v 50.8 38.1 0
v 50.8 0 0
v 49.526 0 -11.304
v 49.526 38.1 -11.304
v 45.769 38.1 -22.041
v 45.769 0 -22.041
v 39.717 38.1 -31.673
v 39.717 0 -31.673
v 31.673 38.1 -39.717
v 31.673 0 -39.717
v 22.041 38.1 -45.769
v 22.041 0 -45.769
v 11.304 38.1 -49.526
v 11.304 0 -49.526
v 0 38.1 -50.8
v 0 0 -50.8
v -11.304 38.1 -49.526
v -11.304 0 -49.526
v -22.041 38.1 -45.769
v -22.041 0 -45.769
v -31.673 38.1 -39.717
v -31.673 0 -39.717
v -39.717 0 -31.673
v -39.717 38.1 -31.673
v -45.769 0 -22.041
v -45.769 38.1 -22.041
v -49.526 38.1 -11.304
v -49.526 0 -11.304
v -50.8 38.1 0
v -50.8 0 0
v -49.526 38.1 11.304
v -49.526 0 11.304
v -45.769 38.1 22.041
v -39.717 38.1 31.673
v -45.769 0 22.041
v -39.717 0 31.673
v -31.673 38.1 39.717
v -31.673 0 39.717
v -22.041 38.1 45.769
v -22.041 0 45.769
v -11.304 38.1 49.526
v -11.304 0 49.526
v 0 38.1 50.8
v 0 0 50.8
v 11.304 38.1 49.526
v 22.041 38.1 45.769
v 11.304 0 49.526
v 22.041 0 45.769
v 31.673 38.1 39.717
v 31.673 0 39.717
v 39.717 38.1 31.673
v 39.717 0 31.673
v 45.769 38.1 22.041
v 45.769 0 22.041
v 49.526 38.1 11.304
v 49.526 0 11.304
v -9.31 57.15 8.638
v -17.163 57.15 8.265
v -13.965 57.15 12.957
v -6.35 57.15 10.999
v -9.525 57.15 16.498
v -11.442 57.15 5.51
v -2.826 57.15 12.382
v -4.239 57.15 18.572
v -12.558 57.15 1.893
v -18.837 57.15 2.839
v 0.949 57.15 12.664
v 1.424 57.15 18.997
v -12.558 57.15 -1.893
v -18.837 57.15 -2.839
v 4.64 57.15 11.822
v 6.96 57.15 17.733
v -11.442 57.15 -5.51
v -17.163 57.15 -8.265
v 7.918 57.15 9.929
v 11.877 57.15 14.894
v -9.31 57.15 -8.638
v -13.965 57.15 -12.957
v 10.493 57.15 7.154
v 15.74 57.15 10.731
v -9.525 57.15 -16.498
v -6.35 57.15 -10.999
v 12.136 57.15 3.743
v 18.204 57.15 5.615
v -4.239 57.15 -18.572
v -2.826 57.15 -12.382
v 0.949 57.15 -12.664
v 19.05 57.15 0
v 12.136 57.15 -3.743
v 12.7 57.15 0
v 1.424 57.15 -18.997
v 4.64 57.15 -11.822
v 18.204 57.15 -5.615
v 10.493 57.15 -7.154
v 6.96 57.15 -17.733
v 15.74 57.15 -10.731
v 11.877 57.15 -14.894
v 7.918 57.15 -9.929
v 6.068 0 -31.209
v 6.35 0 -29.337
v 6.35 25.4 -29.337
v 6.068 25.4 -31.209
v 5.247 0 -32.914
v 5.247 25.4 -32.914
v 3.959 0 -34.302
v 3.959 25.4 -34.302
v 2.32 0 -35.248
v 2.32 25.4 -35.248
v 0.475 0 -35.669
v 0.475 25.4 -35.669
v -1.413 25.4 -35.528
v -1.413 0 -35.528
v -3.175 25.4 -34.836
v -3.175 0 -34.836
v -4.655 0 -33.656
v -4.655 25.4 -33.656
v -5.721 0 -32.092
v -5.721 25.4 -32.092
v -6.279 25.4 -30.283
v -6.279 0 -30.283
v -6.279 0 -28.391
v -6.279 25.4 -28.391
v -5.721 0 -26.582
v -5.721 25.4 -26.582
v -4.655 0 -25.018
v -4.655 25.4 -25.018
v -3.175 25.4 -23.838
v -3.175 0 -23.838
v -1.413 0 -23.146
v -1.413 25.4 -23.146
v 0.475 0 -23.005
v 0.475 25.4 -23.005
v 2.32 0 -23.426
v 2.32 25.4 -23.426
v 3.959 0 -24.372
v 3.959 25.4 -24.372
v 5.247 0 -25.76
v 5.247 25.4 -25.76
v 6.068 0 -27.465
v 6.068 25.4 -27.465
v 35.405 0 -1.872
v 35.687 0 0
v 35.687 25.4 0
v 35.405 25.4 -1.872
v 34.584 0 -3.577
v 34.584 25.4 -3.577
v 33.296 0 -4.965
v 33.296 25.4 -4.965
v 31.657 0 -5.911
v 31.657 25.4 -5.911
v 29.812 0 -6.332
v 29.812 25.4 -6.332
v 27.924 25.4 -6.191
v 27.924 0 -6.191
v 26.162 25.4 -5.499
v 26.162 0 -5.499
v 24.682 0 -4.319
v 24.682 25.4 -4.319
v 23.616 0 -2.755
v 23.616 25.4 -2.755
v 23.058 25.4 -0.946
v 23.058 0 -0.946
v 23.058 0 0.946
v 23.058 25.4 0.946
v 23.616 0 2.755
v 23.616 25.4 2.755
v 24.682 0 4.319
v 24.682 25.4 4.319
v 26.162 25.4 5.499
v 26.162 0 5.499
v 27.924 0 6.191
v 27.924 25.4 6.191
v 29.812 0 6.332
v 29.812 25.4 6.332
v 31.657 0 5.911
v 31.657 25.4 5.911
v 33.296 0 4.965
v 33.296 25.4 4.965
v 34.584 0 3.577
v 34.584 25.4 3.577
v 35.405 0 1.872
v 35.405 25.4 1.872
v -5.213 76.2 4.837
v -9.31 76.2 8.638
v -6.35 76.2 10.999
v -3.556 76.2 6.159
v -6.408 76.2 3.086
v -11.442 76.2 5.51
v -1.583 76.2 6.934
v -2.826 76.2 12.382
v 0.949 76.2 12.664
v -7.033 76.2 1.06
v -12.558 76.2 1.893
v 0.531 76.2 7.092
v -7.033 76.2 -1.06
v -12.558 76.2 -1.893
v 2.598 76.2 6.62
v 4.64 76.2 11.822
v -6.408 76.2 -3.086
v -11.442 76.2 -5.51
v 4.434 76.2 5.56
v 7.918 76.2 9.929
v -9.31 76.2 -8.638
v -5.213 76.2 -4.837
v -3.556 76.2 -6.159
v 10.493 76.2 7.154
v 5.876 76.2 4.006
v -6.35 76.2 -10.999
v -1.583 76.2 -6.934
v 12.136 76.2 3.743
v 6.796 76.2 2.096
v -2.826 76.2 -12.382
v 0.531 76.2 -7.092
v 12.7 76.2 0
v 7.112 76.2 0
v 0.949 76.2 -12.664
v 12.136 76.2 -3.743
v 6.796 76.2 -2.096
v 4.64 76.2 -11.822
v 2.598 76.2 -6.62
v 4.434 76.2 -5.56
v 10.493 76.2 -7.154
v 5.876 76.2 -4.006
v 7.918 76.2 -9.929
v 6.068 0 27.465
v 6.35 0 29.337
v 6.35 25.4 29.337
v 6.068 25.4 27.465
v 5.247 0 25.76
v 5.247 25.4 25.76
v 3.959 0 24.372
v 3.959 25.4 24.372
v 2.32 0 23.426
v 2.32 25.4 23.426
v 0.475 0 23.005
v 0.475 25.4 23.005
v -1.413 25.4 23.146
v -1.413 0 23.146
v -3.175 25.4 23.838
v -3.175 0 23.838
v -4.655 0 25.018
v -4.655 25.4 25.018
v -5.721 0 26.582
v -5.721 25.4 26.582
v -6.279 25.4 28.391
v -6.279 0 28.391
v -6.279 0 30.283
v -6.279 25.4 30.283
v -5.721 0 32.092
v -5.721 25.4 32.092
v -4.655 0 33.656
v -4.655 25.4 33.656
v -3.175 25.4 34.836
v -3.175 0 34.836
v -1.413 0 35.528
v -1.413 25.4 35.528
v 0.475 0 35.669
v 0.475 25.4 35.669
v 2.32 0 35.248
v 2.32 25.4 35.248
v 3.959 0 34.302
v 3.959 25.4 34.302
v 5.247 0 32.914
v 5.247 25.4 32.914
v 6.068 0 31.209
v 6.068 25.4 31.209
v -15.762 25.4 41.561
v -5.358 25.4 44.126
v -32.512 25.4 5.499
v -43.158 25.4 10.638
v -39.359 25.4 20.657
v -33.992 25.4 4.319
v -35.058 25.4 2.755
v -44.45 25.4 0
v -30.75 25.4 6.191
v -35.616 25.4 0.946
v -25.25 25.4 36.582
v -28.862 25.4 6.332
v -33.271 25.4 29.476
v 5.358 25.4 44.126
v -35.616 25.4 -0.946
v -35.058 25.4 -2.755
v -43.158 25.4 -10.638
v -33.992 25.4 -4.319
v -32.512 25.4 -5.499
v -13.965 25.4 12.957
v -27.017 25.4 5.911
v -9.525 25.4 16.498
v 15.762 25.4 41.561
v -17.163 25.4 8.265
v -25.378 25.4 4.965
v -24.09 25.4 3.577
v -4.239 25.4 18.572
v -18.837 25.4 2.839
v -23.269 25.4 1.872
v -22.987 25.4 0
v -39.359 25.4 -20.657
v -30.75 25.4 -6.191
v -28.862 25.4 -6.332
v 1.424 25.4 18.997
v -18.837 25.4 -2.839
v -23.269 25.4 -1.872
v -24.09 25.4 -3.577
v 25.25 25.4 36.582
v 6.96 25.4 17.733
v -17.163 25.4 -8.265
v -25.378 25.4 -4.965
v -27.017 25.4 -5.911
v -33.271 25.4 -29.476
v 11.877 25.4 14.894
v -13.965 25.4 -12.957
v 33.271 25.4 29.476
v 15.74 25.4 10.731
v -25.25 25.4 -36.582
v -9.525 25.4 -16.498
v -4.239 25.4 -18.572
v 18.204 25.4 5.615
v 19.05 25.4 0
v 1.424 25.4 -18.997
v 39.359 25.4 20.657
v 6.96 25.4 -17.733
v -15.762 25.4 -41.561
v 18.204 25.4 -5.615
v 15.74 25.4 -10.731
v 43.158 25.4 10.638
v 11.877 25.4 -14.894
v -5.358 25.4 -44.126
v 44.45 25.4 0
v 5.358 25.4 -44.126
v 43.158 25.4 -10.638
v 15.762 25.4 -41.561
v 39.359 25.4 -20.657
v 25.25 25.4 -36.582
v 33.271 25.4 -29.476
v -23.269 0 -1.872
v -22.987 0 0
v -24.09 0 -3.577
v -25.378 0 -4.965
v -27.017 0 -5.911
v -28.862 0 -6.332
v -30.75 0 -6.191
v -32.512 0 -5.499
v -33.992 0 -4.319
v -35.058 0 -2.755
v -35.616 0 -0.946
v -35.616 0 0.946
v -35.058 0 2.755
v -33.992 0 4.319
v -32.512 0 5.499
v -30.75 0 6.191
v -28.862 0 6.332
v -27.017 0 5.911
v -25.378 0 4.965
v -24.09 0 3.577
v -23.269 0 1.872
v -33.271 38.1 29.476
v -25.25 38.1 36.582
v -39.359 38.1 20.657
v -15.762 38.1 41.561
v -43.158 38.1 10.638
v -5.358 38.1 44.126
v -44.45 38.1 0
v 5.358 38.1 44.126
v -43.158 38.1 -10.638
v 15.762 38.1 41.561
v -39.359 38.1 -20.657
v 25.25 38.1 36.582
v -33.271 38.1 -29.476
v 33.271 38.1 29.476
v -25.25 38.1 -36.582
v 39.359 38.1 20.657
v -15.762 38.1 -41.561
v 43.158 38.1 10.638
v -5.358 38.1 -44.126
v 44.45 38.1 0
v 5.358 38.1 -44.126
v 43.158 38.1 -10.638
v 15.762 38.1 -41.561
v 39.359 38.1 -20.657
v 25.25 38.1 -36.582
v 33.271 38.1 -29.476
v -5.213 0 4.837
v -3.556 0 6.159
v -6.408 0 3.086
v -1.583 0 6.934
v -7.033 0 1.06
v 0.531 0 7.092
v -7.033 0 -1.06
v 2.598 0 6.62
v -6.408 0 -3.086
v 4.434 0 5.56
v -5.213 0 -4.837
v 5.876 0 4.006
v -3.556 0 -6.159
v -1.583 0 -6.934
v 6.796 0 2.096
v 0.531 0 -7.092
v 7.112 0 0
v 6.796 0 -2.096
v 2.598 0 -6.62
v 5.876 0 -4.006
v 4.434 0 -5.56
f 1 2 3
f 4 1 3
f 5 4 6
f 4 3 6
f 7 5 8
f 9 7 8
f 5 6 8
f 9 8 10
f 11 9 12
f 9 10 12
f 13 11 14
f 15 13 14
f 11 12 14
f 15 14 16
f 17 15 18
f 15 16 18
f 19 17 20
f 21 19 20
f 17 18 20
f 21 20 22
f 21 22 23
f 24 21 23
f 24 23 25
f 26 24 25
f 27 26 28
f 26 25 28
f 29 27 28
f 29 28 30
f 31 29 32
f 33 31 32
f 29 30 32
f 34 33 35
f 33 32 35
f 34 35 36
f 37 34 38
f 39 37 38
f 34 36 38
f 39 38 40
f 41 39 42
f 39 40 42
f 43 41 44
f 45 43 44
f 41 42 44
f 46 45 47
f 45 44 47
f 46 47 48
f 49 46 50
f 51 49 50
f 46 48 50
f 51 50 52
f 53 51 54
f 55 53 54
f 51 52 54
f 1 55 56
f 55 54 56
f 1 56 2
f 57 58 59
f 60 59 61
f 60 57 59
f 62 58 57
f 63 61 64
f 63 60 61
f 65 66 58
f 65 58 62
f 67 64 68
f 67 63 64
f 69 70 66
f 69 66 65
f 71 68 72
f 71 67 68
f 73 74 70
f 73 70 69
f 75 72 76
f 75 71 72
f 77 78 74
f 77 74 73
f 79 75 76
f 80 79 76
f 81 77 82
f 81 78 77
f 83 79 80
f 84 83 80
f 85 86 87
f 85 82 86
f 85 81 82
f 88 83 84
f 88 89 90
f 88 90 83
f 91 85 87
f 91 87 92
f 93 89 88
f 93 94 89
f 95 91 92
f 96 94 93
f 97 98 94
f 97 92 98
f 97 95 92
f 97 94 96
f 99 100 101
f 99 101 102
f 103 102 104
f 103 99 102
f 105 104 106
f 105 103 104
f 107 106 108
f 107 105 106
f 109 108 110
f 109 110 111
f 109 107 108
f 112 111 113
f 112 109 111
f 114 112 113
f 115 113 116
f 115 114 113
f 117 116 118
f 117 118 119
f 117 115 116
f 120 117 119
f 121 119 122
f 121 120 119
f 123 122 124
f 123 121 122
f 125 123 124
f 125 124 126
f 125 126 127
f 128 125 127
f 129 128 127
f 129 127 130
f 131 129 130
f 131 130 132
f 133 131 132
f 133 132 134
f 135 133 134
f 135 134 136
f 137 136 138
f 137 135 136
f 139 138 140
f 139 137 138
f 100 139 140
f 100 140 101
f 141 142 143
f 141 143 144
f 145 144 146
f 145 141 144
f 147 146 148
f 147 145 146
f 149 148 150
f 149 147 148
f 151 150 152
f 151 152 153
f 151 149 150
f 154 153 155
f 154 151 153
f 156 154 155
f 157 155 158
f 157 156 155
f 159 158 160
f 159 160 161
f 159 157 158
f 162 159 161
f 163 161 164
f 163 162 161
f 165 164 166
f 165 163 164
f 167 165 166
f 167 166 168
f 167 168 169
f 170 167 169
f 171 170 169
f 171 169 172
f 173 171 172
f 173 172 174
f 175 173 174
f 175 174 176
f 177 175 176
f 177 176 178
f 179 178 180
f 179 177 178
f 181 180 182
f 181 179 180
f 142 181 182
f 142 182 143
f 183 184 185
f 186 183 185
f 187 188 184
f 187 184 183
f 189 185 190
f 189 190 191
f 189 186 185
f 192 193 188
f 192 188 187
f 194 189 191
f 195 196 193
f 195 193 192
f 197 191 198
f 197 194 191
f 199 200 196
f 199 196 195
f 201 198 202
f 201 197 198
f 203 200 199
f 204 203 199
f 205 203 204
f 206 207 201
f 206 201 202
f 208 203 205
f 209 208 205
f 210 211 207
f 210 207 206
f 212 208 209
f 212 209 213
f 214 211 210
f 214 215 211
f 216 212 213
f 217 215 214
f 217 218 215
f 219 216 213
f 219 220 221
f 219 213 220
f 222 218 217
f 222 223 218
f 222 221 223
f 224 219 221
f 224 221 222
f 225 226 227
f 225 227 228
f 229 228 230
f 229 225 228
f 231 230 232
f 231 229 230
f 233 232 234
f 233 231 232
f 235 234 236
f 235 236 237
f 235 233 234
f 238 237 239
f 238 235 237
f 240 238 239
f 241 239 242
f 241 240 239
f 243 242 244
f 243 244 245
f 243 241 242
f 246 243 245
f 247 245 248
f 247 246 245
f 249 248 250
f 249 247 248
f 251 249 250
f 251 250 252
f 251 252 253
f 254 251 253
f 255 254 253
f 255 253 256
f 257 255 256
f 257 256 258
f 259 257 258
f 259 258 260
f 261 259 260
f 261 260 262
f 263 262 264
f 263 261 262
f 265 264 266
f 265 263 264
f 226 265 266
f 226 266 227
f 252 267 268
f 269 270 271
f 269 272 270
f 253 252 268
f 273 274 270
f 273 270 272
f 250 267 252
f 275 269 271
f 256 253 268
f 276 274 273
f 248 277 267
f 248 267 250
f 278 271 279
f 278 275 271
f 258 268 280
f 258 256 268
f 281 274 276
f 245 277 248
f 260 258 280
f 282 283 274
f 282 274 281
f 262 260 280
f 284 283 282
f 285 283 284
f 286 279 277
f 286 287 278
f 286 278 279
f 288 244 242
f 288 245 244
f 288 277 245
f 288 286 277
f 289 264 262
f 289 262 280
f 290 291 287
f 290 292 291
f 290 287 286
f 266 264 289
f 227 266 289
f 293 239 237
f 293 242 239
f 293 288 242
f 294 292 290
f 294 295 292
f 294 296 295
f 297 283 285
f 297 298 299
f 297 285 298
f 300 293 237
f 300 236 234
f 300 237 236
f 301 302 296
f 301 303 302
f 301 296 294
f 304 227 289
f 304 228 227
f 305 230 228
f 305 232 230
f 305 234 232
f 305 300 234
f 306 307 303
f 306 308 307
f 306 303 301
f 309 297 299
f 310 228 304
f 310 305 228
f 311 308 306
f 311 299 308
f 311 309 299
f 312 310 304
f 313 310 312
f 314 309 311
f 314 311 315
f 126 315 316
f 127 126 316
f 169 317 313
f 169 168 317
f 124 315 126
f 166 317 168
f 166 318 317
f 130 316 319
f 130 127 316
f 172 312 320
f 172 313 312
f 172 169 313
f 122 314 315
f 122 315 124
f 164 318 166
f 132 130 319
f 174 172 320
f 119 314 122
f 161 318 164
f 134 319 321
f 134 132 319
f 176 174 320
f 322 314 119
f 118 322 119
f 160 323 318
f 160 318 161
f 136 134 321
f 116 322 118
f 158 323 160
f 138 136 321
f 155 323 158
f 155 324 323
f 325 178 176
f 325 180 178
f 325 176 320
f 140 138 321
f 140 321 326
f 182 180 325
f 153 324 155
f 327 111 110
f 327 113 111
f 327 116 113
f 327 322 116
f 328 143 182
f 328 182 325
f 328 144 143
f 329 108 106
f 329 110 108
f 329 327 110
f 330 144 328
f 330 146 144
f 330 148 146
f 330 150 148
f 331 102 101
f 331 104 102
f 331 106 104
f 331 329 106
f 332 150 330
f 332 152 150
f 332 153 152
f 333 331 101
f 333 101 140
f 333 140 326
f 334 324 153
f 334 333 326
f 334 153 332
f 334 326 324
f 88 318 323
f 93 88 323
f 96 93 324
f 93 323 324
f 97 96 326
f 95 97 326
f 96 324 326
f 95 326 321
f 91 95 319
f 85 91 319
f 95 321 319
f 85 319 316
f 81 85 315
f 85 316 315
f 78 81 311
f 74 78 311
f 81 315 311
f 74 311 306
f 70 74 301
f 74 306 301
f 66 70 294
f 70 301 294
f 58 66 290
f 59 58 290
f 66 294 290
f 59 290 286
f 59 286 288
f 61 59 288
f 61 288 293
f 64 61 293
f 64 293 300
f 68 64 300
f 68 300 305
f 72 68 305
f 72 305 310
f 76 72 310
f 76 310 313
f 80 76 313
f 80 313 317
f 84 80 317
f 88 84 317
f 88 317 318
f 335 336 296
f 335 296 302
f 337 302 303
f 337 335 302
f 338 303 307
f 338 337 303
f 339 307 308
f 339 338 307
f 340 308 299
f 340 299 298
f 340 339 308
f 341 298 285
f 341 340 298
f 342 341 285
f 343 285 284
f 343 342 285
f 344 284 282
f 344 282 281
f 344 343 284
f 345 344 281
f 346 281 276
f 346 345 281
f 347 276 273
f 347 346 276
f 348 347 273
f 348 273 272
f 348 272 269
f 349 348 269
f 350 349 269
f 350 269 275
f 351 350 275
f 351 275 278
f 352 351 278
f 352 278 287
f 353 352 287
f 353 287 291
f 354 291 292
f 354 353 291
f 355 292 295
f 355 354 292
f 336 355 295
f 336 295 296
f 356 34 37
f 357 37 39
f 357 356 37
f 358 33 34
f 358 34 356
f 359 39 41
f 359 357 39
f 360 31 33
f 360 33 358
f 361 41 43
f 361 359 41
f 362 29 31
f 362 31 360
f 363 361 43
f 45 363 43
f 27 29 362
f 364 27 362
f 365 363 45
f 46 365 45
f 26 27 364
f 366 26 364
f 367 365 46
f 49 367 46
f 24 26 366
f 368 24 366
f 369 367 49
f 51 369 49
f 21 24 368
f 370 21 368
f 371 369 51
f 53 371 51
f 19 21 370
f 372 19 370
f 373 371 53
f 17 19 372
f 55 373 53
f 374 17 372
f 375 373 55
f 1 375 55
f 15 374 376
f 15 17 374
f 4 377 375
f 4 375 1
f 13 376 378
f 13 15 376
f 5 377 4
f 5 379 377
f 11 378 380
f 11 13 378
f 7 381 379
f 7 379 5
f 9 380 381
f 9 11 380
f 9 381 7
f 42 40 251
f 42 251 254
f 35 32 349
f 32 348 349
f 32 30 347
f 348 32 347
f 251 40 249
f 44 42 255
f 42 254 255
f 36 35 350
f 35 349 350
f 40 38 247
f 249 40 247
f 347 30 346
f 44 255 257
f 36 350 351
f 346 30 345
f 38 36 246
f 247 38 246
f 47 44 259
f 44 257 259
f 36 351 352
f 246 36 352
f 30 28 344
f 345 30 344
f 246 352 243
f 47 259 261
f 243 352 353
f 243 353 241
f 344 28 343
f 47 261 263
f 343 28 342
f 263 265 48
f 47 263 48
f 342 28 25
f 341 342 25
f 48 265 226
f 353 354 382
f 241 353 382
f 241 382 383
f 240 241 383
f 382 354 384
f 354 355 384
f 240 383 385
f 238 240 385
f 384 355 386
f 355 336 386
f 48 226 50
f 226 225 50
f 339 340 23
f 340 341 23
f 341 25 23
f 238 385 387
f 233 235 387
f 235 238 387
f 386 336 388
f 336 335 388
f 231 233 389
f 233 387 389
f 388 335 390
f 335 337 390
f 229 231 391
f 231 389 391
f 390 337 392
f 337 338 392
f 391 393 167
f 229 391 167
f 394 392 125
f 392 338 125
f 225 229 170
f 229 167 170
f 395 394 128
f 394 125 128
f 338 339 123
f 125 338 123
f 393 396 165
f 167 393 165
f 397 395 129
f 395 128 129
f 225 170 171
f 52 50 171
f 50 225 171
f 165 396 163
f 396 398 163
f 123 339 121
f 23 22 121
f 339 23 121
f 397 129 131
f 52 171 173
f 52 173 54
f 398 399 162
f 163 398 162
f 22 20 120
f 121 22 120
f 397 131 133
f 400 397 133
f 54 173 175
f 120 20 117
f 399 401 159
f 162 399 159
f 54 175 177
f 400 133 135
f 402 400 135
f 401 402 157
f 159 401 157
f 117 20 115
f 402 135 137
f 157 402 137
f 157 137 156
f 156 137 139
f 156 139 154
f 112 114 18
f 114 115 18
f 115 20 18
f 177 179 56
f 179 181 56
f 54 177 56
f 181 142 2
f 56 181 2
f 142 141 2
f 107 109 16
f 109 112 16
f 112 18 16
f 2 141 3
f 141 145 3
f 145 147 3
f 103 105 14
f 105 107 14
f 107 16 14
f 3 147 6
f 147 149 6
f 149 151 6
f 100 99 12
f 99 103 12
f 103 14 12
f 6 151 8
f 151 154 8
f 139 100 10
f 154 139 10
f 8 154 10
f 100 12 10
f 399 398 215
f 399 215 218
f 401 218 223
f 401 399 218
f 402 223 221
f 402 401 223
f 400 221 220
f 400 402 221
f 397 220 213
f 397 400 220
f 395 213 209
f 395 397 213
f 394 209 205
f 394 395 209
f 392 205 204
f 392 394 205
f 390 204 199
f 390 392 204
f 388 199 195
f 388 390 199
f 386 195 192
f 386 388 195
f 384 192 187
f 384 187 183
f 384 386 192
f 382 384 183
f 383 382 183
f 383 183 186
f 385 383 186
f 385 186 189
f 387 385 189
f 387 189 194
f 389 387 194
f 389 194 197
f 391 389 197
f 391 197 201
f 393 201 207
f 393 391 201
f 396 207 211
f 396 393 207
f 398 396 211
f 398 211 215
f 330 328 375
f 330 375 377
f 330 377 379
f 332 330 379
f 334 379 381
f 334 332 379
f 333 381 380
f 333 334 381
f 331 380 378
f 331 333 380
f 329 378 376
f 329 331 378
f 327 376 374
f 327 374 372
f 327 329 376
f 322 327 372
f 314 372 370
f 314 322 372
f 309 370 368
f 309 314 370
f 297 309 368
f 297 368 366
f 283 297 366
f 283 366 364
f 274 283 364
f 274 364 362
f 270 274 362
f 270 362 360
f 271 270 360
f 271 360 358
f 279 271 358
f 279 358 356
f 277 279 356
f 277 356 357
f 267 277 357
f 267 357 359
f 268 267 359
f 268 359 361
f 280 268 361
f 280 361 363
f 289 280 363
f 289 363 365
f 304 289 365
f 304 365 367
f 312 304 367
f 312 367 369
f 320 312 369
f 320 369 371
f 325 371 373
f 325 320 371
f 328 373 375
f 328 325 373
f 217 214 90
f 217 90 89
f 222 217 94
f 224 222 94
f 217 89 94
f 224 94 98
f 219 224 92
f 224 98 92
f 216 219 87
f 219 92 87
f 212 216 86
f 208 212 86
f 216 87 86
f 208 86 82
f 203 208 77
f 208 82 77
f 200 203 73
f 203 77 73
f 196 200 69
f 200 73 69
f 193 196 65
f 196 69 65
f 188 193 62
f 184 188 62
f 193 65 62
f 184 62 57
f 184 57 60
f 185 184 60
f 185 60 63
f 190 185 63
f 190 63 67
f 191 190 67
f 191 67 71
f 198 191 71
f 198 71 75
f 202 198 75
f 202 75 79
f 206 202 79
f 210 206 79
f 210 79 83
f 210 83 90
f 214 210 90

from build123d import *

# Parameters (mm, degrees)
SKETCH1_R           = 50.8
SKETCH1_R_2         = 44.45
BOSS_EXTRUDE1_DEPTH = 38.1
SKETCH1_4_R         = 44.45
SKETCH1_4_R_2       = 6.35
SKETCH1_4_R_3       = 19.05
BOSS_EXTRUDE3_DEPTH = 25.4
SKETCH1_5_R         = 19.05
SKETCH1_5_R_2       = 12.7
BOSS_EXTRUDE4_DEPTH = 57.15
SKETCH1_6_R         = 12.7
SKETCH1_6_R_2       = 7.112
BOSS_EXTRUDE5_DEPTH = 76.2


with BuildPart() as part:
    # Sketch1 → Boss-Extrude1 (new body)
    with BuildSketch(Plane(origin=(0, 0, 0), x_dir=(1, 0, 0), z_dir=(0, 1, 0))):
        Circle(SKETCH1_R)
        Circle(SKETCH1_R_2, mode=Mode.SUBTRACT)
    extrude(amount=BOSS_EXTRUDE1_DEPTH)

    # Sketch1<4> → Boss-Extrude3 (add)
    with BuildSketch(Plane(origin=(0, 0, 0), x_dir=(1, 0, 0), z_dir=(0, 1, 0))):
        Circle(SKETCH1_4_R)
        with Locations((29.337, 0)):
            Circle(SKETCH1_4_R_2, mode=Mode.SUBTRACT)
        with Locations((0, -29.337)):
            Circle(SKETCH1_4_R_2, mode=Mode.SUBTRACT)
        with Locations((-29.337, 0)):
            Circle(SKETCH1_4_R_2, mode=Mode.SUBTRACT)
        with Locations((0, 29.337)):
            Circle(SKETCH1_4_R_2, mode=Mode.SUBTRACT)
        Circle(SKETCH1_4_R_3, mode=Mode.SUBTRACT)
    extrude(amount=BOSS_EXTRUDE3_DEPTH)

    # Sketch1<5> → Boss-Extrude4 (add)
    with BuildSketch(Plane(origin=(0, 0, 0), x_dir=(1, 0, 0), z_dir=(0, 1, 0))):
        Circle(SKETCH1_5_R)
        Circle(SKETCH1_5_R_2, mode=Mode.SUBTRACT)
    extrude(amount=BOSS_EXTRUDE4_DEPTH)

    # Sketch1<6> → Boss-Extrude5 (add)
    with BuildSketch(Plane(origin=(0, 0, 0), x_dir=(1, 0, 0), z_dir=(0, 1, 0))):
        Circle(SKETCH1_6_R)
        Circle(SKETCH1_6_R_2, mode=Mode.SUBTRACT)
    extrude(amount=BOSS_EXTRUDE5_DEPTH)


solid = part.part
